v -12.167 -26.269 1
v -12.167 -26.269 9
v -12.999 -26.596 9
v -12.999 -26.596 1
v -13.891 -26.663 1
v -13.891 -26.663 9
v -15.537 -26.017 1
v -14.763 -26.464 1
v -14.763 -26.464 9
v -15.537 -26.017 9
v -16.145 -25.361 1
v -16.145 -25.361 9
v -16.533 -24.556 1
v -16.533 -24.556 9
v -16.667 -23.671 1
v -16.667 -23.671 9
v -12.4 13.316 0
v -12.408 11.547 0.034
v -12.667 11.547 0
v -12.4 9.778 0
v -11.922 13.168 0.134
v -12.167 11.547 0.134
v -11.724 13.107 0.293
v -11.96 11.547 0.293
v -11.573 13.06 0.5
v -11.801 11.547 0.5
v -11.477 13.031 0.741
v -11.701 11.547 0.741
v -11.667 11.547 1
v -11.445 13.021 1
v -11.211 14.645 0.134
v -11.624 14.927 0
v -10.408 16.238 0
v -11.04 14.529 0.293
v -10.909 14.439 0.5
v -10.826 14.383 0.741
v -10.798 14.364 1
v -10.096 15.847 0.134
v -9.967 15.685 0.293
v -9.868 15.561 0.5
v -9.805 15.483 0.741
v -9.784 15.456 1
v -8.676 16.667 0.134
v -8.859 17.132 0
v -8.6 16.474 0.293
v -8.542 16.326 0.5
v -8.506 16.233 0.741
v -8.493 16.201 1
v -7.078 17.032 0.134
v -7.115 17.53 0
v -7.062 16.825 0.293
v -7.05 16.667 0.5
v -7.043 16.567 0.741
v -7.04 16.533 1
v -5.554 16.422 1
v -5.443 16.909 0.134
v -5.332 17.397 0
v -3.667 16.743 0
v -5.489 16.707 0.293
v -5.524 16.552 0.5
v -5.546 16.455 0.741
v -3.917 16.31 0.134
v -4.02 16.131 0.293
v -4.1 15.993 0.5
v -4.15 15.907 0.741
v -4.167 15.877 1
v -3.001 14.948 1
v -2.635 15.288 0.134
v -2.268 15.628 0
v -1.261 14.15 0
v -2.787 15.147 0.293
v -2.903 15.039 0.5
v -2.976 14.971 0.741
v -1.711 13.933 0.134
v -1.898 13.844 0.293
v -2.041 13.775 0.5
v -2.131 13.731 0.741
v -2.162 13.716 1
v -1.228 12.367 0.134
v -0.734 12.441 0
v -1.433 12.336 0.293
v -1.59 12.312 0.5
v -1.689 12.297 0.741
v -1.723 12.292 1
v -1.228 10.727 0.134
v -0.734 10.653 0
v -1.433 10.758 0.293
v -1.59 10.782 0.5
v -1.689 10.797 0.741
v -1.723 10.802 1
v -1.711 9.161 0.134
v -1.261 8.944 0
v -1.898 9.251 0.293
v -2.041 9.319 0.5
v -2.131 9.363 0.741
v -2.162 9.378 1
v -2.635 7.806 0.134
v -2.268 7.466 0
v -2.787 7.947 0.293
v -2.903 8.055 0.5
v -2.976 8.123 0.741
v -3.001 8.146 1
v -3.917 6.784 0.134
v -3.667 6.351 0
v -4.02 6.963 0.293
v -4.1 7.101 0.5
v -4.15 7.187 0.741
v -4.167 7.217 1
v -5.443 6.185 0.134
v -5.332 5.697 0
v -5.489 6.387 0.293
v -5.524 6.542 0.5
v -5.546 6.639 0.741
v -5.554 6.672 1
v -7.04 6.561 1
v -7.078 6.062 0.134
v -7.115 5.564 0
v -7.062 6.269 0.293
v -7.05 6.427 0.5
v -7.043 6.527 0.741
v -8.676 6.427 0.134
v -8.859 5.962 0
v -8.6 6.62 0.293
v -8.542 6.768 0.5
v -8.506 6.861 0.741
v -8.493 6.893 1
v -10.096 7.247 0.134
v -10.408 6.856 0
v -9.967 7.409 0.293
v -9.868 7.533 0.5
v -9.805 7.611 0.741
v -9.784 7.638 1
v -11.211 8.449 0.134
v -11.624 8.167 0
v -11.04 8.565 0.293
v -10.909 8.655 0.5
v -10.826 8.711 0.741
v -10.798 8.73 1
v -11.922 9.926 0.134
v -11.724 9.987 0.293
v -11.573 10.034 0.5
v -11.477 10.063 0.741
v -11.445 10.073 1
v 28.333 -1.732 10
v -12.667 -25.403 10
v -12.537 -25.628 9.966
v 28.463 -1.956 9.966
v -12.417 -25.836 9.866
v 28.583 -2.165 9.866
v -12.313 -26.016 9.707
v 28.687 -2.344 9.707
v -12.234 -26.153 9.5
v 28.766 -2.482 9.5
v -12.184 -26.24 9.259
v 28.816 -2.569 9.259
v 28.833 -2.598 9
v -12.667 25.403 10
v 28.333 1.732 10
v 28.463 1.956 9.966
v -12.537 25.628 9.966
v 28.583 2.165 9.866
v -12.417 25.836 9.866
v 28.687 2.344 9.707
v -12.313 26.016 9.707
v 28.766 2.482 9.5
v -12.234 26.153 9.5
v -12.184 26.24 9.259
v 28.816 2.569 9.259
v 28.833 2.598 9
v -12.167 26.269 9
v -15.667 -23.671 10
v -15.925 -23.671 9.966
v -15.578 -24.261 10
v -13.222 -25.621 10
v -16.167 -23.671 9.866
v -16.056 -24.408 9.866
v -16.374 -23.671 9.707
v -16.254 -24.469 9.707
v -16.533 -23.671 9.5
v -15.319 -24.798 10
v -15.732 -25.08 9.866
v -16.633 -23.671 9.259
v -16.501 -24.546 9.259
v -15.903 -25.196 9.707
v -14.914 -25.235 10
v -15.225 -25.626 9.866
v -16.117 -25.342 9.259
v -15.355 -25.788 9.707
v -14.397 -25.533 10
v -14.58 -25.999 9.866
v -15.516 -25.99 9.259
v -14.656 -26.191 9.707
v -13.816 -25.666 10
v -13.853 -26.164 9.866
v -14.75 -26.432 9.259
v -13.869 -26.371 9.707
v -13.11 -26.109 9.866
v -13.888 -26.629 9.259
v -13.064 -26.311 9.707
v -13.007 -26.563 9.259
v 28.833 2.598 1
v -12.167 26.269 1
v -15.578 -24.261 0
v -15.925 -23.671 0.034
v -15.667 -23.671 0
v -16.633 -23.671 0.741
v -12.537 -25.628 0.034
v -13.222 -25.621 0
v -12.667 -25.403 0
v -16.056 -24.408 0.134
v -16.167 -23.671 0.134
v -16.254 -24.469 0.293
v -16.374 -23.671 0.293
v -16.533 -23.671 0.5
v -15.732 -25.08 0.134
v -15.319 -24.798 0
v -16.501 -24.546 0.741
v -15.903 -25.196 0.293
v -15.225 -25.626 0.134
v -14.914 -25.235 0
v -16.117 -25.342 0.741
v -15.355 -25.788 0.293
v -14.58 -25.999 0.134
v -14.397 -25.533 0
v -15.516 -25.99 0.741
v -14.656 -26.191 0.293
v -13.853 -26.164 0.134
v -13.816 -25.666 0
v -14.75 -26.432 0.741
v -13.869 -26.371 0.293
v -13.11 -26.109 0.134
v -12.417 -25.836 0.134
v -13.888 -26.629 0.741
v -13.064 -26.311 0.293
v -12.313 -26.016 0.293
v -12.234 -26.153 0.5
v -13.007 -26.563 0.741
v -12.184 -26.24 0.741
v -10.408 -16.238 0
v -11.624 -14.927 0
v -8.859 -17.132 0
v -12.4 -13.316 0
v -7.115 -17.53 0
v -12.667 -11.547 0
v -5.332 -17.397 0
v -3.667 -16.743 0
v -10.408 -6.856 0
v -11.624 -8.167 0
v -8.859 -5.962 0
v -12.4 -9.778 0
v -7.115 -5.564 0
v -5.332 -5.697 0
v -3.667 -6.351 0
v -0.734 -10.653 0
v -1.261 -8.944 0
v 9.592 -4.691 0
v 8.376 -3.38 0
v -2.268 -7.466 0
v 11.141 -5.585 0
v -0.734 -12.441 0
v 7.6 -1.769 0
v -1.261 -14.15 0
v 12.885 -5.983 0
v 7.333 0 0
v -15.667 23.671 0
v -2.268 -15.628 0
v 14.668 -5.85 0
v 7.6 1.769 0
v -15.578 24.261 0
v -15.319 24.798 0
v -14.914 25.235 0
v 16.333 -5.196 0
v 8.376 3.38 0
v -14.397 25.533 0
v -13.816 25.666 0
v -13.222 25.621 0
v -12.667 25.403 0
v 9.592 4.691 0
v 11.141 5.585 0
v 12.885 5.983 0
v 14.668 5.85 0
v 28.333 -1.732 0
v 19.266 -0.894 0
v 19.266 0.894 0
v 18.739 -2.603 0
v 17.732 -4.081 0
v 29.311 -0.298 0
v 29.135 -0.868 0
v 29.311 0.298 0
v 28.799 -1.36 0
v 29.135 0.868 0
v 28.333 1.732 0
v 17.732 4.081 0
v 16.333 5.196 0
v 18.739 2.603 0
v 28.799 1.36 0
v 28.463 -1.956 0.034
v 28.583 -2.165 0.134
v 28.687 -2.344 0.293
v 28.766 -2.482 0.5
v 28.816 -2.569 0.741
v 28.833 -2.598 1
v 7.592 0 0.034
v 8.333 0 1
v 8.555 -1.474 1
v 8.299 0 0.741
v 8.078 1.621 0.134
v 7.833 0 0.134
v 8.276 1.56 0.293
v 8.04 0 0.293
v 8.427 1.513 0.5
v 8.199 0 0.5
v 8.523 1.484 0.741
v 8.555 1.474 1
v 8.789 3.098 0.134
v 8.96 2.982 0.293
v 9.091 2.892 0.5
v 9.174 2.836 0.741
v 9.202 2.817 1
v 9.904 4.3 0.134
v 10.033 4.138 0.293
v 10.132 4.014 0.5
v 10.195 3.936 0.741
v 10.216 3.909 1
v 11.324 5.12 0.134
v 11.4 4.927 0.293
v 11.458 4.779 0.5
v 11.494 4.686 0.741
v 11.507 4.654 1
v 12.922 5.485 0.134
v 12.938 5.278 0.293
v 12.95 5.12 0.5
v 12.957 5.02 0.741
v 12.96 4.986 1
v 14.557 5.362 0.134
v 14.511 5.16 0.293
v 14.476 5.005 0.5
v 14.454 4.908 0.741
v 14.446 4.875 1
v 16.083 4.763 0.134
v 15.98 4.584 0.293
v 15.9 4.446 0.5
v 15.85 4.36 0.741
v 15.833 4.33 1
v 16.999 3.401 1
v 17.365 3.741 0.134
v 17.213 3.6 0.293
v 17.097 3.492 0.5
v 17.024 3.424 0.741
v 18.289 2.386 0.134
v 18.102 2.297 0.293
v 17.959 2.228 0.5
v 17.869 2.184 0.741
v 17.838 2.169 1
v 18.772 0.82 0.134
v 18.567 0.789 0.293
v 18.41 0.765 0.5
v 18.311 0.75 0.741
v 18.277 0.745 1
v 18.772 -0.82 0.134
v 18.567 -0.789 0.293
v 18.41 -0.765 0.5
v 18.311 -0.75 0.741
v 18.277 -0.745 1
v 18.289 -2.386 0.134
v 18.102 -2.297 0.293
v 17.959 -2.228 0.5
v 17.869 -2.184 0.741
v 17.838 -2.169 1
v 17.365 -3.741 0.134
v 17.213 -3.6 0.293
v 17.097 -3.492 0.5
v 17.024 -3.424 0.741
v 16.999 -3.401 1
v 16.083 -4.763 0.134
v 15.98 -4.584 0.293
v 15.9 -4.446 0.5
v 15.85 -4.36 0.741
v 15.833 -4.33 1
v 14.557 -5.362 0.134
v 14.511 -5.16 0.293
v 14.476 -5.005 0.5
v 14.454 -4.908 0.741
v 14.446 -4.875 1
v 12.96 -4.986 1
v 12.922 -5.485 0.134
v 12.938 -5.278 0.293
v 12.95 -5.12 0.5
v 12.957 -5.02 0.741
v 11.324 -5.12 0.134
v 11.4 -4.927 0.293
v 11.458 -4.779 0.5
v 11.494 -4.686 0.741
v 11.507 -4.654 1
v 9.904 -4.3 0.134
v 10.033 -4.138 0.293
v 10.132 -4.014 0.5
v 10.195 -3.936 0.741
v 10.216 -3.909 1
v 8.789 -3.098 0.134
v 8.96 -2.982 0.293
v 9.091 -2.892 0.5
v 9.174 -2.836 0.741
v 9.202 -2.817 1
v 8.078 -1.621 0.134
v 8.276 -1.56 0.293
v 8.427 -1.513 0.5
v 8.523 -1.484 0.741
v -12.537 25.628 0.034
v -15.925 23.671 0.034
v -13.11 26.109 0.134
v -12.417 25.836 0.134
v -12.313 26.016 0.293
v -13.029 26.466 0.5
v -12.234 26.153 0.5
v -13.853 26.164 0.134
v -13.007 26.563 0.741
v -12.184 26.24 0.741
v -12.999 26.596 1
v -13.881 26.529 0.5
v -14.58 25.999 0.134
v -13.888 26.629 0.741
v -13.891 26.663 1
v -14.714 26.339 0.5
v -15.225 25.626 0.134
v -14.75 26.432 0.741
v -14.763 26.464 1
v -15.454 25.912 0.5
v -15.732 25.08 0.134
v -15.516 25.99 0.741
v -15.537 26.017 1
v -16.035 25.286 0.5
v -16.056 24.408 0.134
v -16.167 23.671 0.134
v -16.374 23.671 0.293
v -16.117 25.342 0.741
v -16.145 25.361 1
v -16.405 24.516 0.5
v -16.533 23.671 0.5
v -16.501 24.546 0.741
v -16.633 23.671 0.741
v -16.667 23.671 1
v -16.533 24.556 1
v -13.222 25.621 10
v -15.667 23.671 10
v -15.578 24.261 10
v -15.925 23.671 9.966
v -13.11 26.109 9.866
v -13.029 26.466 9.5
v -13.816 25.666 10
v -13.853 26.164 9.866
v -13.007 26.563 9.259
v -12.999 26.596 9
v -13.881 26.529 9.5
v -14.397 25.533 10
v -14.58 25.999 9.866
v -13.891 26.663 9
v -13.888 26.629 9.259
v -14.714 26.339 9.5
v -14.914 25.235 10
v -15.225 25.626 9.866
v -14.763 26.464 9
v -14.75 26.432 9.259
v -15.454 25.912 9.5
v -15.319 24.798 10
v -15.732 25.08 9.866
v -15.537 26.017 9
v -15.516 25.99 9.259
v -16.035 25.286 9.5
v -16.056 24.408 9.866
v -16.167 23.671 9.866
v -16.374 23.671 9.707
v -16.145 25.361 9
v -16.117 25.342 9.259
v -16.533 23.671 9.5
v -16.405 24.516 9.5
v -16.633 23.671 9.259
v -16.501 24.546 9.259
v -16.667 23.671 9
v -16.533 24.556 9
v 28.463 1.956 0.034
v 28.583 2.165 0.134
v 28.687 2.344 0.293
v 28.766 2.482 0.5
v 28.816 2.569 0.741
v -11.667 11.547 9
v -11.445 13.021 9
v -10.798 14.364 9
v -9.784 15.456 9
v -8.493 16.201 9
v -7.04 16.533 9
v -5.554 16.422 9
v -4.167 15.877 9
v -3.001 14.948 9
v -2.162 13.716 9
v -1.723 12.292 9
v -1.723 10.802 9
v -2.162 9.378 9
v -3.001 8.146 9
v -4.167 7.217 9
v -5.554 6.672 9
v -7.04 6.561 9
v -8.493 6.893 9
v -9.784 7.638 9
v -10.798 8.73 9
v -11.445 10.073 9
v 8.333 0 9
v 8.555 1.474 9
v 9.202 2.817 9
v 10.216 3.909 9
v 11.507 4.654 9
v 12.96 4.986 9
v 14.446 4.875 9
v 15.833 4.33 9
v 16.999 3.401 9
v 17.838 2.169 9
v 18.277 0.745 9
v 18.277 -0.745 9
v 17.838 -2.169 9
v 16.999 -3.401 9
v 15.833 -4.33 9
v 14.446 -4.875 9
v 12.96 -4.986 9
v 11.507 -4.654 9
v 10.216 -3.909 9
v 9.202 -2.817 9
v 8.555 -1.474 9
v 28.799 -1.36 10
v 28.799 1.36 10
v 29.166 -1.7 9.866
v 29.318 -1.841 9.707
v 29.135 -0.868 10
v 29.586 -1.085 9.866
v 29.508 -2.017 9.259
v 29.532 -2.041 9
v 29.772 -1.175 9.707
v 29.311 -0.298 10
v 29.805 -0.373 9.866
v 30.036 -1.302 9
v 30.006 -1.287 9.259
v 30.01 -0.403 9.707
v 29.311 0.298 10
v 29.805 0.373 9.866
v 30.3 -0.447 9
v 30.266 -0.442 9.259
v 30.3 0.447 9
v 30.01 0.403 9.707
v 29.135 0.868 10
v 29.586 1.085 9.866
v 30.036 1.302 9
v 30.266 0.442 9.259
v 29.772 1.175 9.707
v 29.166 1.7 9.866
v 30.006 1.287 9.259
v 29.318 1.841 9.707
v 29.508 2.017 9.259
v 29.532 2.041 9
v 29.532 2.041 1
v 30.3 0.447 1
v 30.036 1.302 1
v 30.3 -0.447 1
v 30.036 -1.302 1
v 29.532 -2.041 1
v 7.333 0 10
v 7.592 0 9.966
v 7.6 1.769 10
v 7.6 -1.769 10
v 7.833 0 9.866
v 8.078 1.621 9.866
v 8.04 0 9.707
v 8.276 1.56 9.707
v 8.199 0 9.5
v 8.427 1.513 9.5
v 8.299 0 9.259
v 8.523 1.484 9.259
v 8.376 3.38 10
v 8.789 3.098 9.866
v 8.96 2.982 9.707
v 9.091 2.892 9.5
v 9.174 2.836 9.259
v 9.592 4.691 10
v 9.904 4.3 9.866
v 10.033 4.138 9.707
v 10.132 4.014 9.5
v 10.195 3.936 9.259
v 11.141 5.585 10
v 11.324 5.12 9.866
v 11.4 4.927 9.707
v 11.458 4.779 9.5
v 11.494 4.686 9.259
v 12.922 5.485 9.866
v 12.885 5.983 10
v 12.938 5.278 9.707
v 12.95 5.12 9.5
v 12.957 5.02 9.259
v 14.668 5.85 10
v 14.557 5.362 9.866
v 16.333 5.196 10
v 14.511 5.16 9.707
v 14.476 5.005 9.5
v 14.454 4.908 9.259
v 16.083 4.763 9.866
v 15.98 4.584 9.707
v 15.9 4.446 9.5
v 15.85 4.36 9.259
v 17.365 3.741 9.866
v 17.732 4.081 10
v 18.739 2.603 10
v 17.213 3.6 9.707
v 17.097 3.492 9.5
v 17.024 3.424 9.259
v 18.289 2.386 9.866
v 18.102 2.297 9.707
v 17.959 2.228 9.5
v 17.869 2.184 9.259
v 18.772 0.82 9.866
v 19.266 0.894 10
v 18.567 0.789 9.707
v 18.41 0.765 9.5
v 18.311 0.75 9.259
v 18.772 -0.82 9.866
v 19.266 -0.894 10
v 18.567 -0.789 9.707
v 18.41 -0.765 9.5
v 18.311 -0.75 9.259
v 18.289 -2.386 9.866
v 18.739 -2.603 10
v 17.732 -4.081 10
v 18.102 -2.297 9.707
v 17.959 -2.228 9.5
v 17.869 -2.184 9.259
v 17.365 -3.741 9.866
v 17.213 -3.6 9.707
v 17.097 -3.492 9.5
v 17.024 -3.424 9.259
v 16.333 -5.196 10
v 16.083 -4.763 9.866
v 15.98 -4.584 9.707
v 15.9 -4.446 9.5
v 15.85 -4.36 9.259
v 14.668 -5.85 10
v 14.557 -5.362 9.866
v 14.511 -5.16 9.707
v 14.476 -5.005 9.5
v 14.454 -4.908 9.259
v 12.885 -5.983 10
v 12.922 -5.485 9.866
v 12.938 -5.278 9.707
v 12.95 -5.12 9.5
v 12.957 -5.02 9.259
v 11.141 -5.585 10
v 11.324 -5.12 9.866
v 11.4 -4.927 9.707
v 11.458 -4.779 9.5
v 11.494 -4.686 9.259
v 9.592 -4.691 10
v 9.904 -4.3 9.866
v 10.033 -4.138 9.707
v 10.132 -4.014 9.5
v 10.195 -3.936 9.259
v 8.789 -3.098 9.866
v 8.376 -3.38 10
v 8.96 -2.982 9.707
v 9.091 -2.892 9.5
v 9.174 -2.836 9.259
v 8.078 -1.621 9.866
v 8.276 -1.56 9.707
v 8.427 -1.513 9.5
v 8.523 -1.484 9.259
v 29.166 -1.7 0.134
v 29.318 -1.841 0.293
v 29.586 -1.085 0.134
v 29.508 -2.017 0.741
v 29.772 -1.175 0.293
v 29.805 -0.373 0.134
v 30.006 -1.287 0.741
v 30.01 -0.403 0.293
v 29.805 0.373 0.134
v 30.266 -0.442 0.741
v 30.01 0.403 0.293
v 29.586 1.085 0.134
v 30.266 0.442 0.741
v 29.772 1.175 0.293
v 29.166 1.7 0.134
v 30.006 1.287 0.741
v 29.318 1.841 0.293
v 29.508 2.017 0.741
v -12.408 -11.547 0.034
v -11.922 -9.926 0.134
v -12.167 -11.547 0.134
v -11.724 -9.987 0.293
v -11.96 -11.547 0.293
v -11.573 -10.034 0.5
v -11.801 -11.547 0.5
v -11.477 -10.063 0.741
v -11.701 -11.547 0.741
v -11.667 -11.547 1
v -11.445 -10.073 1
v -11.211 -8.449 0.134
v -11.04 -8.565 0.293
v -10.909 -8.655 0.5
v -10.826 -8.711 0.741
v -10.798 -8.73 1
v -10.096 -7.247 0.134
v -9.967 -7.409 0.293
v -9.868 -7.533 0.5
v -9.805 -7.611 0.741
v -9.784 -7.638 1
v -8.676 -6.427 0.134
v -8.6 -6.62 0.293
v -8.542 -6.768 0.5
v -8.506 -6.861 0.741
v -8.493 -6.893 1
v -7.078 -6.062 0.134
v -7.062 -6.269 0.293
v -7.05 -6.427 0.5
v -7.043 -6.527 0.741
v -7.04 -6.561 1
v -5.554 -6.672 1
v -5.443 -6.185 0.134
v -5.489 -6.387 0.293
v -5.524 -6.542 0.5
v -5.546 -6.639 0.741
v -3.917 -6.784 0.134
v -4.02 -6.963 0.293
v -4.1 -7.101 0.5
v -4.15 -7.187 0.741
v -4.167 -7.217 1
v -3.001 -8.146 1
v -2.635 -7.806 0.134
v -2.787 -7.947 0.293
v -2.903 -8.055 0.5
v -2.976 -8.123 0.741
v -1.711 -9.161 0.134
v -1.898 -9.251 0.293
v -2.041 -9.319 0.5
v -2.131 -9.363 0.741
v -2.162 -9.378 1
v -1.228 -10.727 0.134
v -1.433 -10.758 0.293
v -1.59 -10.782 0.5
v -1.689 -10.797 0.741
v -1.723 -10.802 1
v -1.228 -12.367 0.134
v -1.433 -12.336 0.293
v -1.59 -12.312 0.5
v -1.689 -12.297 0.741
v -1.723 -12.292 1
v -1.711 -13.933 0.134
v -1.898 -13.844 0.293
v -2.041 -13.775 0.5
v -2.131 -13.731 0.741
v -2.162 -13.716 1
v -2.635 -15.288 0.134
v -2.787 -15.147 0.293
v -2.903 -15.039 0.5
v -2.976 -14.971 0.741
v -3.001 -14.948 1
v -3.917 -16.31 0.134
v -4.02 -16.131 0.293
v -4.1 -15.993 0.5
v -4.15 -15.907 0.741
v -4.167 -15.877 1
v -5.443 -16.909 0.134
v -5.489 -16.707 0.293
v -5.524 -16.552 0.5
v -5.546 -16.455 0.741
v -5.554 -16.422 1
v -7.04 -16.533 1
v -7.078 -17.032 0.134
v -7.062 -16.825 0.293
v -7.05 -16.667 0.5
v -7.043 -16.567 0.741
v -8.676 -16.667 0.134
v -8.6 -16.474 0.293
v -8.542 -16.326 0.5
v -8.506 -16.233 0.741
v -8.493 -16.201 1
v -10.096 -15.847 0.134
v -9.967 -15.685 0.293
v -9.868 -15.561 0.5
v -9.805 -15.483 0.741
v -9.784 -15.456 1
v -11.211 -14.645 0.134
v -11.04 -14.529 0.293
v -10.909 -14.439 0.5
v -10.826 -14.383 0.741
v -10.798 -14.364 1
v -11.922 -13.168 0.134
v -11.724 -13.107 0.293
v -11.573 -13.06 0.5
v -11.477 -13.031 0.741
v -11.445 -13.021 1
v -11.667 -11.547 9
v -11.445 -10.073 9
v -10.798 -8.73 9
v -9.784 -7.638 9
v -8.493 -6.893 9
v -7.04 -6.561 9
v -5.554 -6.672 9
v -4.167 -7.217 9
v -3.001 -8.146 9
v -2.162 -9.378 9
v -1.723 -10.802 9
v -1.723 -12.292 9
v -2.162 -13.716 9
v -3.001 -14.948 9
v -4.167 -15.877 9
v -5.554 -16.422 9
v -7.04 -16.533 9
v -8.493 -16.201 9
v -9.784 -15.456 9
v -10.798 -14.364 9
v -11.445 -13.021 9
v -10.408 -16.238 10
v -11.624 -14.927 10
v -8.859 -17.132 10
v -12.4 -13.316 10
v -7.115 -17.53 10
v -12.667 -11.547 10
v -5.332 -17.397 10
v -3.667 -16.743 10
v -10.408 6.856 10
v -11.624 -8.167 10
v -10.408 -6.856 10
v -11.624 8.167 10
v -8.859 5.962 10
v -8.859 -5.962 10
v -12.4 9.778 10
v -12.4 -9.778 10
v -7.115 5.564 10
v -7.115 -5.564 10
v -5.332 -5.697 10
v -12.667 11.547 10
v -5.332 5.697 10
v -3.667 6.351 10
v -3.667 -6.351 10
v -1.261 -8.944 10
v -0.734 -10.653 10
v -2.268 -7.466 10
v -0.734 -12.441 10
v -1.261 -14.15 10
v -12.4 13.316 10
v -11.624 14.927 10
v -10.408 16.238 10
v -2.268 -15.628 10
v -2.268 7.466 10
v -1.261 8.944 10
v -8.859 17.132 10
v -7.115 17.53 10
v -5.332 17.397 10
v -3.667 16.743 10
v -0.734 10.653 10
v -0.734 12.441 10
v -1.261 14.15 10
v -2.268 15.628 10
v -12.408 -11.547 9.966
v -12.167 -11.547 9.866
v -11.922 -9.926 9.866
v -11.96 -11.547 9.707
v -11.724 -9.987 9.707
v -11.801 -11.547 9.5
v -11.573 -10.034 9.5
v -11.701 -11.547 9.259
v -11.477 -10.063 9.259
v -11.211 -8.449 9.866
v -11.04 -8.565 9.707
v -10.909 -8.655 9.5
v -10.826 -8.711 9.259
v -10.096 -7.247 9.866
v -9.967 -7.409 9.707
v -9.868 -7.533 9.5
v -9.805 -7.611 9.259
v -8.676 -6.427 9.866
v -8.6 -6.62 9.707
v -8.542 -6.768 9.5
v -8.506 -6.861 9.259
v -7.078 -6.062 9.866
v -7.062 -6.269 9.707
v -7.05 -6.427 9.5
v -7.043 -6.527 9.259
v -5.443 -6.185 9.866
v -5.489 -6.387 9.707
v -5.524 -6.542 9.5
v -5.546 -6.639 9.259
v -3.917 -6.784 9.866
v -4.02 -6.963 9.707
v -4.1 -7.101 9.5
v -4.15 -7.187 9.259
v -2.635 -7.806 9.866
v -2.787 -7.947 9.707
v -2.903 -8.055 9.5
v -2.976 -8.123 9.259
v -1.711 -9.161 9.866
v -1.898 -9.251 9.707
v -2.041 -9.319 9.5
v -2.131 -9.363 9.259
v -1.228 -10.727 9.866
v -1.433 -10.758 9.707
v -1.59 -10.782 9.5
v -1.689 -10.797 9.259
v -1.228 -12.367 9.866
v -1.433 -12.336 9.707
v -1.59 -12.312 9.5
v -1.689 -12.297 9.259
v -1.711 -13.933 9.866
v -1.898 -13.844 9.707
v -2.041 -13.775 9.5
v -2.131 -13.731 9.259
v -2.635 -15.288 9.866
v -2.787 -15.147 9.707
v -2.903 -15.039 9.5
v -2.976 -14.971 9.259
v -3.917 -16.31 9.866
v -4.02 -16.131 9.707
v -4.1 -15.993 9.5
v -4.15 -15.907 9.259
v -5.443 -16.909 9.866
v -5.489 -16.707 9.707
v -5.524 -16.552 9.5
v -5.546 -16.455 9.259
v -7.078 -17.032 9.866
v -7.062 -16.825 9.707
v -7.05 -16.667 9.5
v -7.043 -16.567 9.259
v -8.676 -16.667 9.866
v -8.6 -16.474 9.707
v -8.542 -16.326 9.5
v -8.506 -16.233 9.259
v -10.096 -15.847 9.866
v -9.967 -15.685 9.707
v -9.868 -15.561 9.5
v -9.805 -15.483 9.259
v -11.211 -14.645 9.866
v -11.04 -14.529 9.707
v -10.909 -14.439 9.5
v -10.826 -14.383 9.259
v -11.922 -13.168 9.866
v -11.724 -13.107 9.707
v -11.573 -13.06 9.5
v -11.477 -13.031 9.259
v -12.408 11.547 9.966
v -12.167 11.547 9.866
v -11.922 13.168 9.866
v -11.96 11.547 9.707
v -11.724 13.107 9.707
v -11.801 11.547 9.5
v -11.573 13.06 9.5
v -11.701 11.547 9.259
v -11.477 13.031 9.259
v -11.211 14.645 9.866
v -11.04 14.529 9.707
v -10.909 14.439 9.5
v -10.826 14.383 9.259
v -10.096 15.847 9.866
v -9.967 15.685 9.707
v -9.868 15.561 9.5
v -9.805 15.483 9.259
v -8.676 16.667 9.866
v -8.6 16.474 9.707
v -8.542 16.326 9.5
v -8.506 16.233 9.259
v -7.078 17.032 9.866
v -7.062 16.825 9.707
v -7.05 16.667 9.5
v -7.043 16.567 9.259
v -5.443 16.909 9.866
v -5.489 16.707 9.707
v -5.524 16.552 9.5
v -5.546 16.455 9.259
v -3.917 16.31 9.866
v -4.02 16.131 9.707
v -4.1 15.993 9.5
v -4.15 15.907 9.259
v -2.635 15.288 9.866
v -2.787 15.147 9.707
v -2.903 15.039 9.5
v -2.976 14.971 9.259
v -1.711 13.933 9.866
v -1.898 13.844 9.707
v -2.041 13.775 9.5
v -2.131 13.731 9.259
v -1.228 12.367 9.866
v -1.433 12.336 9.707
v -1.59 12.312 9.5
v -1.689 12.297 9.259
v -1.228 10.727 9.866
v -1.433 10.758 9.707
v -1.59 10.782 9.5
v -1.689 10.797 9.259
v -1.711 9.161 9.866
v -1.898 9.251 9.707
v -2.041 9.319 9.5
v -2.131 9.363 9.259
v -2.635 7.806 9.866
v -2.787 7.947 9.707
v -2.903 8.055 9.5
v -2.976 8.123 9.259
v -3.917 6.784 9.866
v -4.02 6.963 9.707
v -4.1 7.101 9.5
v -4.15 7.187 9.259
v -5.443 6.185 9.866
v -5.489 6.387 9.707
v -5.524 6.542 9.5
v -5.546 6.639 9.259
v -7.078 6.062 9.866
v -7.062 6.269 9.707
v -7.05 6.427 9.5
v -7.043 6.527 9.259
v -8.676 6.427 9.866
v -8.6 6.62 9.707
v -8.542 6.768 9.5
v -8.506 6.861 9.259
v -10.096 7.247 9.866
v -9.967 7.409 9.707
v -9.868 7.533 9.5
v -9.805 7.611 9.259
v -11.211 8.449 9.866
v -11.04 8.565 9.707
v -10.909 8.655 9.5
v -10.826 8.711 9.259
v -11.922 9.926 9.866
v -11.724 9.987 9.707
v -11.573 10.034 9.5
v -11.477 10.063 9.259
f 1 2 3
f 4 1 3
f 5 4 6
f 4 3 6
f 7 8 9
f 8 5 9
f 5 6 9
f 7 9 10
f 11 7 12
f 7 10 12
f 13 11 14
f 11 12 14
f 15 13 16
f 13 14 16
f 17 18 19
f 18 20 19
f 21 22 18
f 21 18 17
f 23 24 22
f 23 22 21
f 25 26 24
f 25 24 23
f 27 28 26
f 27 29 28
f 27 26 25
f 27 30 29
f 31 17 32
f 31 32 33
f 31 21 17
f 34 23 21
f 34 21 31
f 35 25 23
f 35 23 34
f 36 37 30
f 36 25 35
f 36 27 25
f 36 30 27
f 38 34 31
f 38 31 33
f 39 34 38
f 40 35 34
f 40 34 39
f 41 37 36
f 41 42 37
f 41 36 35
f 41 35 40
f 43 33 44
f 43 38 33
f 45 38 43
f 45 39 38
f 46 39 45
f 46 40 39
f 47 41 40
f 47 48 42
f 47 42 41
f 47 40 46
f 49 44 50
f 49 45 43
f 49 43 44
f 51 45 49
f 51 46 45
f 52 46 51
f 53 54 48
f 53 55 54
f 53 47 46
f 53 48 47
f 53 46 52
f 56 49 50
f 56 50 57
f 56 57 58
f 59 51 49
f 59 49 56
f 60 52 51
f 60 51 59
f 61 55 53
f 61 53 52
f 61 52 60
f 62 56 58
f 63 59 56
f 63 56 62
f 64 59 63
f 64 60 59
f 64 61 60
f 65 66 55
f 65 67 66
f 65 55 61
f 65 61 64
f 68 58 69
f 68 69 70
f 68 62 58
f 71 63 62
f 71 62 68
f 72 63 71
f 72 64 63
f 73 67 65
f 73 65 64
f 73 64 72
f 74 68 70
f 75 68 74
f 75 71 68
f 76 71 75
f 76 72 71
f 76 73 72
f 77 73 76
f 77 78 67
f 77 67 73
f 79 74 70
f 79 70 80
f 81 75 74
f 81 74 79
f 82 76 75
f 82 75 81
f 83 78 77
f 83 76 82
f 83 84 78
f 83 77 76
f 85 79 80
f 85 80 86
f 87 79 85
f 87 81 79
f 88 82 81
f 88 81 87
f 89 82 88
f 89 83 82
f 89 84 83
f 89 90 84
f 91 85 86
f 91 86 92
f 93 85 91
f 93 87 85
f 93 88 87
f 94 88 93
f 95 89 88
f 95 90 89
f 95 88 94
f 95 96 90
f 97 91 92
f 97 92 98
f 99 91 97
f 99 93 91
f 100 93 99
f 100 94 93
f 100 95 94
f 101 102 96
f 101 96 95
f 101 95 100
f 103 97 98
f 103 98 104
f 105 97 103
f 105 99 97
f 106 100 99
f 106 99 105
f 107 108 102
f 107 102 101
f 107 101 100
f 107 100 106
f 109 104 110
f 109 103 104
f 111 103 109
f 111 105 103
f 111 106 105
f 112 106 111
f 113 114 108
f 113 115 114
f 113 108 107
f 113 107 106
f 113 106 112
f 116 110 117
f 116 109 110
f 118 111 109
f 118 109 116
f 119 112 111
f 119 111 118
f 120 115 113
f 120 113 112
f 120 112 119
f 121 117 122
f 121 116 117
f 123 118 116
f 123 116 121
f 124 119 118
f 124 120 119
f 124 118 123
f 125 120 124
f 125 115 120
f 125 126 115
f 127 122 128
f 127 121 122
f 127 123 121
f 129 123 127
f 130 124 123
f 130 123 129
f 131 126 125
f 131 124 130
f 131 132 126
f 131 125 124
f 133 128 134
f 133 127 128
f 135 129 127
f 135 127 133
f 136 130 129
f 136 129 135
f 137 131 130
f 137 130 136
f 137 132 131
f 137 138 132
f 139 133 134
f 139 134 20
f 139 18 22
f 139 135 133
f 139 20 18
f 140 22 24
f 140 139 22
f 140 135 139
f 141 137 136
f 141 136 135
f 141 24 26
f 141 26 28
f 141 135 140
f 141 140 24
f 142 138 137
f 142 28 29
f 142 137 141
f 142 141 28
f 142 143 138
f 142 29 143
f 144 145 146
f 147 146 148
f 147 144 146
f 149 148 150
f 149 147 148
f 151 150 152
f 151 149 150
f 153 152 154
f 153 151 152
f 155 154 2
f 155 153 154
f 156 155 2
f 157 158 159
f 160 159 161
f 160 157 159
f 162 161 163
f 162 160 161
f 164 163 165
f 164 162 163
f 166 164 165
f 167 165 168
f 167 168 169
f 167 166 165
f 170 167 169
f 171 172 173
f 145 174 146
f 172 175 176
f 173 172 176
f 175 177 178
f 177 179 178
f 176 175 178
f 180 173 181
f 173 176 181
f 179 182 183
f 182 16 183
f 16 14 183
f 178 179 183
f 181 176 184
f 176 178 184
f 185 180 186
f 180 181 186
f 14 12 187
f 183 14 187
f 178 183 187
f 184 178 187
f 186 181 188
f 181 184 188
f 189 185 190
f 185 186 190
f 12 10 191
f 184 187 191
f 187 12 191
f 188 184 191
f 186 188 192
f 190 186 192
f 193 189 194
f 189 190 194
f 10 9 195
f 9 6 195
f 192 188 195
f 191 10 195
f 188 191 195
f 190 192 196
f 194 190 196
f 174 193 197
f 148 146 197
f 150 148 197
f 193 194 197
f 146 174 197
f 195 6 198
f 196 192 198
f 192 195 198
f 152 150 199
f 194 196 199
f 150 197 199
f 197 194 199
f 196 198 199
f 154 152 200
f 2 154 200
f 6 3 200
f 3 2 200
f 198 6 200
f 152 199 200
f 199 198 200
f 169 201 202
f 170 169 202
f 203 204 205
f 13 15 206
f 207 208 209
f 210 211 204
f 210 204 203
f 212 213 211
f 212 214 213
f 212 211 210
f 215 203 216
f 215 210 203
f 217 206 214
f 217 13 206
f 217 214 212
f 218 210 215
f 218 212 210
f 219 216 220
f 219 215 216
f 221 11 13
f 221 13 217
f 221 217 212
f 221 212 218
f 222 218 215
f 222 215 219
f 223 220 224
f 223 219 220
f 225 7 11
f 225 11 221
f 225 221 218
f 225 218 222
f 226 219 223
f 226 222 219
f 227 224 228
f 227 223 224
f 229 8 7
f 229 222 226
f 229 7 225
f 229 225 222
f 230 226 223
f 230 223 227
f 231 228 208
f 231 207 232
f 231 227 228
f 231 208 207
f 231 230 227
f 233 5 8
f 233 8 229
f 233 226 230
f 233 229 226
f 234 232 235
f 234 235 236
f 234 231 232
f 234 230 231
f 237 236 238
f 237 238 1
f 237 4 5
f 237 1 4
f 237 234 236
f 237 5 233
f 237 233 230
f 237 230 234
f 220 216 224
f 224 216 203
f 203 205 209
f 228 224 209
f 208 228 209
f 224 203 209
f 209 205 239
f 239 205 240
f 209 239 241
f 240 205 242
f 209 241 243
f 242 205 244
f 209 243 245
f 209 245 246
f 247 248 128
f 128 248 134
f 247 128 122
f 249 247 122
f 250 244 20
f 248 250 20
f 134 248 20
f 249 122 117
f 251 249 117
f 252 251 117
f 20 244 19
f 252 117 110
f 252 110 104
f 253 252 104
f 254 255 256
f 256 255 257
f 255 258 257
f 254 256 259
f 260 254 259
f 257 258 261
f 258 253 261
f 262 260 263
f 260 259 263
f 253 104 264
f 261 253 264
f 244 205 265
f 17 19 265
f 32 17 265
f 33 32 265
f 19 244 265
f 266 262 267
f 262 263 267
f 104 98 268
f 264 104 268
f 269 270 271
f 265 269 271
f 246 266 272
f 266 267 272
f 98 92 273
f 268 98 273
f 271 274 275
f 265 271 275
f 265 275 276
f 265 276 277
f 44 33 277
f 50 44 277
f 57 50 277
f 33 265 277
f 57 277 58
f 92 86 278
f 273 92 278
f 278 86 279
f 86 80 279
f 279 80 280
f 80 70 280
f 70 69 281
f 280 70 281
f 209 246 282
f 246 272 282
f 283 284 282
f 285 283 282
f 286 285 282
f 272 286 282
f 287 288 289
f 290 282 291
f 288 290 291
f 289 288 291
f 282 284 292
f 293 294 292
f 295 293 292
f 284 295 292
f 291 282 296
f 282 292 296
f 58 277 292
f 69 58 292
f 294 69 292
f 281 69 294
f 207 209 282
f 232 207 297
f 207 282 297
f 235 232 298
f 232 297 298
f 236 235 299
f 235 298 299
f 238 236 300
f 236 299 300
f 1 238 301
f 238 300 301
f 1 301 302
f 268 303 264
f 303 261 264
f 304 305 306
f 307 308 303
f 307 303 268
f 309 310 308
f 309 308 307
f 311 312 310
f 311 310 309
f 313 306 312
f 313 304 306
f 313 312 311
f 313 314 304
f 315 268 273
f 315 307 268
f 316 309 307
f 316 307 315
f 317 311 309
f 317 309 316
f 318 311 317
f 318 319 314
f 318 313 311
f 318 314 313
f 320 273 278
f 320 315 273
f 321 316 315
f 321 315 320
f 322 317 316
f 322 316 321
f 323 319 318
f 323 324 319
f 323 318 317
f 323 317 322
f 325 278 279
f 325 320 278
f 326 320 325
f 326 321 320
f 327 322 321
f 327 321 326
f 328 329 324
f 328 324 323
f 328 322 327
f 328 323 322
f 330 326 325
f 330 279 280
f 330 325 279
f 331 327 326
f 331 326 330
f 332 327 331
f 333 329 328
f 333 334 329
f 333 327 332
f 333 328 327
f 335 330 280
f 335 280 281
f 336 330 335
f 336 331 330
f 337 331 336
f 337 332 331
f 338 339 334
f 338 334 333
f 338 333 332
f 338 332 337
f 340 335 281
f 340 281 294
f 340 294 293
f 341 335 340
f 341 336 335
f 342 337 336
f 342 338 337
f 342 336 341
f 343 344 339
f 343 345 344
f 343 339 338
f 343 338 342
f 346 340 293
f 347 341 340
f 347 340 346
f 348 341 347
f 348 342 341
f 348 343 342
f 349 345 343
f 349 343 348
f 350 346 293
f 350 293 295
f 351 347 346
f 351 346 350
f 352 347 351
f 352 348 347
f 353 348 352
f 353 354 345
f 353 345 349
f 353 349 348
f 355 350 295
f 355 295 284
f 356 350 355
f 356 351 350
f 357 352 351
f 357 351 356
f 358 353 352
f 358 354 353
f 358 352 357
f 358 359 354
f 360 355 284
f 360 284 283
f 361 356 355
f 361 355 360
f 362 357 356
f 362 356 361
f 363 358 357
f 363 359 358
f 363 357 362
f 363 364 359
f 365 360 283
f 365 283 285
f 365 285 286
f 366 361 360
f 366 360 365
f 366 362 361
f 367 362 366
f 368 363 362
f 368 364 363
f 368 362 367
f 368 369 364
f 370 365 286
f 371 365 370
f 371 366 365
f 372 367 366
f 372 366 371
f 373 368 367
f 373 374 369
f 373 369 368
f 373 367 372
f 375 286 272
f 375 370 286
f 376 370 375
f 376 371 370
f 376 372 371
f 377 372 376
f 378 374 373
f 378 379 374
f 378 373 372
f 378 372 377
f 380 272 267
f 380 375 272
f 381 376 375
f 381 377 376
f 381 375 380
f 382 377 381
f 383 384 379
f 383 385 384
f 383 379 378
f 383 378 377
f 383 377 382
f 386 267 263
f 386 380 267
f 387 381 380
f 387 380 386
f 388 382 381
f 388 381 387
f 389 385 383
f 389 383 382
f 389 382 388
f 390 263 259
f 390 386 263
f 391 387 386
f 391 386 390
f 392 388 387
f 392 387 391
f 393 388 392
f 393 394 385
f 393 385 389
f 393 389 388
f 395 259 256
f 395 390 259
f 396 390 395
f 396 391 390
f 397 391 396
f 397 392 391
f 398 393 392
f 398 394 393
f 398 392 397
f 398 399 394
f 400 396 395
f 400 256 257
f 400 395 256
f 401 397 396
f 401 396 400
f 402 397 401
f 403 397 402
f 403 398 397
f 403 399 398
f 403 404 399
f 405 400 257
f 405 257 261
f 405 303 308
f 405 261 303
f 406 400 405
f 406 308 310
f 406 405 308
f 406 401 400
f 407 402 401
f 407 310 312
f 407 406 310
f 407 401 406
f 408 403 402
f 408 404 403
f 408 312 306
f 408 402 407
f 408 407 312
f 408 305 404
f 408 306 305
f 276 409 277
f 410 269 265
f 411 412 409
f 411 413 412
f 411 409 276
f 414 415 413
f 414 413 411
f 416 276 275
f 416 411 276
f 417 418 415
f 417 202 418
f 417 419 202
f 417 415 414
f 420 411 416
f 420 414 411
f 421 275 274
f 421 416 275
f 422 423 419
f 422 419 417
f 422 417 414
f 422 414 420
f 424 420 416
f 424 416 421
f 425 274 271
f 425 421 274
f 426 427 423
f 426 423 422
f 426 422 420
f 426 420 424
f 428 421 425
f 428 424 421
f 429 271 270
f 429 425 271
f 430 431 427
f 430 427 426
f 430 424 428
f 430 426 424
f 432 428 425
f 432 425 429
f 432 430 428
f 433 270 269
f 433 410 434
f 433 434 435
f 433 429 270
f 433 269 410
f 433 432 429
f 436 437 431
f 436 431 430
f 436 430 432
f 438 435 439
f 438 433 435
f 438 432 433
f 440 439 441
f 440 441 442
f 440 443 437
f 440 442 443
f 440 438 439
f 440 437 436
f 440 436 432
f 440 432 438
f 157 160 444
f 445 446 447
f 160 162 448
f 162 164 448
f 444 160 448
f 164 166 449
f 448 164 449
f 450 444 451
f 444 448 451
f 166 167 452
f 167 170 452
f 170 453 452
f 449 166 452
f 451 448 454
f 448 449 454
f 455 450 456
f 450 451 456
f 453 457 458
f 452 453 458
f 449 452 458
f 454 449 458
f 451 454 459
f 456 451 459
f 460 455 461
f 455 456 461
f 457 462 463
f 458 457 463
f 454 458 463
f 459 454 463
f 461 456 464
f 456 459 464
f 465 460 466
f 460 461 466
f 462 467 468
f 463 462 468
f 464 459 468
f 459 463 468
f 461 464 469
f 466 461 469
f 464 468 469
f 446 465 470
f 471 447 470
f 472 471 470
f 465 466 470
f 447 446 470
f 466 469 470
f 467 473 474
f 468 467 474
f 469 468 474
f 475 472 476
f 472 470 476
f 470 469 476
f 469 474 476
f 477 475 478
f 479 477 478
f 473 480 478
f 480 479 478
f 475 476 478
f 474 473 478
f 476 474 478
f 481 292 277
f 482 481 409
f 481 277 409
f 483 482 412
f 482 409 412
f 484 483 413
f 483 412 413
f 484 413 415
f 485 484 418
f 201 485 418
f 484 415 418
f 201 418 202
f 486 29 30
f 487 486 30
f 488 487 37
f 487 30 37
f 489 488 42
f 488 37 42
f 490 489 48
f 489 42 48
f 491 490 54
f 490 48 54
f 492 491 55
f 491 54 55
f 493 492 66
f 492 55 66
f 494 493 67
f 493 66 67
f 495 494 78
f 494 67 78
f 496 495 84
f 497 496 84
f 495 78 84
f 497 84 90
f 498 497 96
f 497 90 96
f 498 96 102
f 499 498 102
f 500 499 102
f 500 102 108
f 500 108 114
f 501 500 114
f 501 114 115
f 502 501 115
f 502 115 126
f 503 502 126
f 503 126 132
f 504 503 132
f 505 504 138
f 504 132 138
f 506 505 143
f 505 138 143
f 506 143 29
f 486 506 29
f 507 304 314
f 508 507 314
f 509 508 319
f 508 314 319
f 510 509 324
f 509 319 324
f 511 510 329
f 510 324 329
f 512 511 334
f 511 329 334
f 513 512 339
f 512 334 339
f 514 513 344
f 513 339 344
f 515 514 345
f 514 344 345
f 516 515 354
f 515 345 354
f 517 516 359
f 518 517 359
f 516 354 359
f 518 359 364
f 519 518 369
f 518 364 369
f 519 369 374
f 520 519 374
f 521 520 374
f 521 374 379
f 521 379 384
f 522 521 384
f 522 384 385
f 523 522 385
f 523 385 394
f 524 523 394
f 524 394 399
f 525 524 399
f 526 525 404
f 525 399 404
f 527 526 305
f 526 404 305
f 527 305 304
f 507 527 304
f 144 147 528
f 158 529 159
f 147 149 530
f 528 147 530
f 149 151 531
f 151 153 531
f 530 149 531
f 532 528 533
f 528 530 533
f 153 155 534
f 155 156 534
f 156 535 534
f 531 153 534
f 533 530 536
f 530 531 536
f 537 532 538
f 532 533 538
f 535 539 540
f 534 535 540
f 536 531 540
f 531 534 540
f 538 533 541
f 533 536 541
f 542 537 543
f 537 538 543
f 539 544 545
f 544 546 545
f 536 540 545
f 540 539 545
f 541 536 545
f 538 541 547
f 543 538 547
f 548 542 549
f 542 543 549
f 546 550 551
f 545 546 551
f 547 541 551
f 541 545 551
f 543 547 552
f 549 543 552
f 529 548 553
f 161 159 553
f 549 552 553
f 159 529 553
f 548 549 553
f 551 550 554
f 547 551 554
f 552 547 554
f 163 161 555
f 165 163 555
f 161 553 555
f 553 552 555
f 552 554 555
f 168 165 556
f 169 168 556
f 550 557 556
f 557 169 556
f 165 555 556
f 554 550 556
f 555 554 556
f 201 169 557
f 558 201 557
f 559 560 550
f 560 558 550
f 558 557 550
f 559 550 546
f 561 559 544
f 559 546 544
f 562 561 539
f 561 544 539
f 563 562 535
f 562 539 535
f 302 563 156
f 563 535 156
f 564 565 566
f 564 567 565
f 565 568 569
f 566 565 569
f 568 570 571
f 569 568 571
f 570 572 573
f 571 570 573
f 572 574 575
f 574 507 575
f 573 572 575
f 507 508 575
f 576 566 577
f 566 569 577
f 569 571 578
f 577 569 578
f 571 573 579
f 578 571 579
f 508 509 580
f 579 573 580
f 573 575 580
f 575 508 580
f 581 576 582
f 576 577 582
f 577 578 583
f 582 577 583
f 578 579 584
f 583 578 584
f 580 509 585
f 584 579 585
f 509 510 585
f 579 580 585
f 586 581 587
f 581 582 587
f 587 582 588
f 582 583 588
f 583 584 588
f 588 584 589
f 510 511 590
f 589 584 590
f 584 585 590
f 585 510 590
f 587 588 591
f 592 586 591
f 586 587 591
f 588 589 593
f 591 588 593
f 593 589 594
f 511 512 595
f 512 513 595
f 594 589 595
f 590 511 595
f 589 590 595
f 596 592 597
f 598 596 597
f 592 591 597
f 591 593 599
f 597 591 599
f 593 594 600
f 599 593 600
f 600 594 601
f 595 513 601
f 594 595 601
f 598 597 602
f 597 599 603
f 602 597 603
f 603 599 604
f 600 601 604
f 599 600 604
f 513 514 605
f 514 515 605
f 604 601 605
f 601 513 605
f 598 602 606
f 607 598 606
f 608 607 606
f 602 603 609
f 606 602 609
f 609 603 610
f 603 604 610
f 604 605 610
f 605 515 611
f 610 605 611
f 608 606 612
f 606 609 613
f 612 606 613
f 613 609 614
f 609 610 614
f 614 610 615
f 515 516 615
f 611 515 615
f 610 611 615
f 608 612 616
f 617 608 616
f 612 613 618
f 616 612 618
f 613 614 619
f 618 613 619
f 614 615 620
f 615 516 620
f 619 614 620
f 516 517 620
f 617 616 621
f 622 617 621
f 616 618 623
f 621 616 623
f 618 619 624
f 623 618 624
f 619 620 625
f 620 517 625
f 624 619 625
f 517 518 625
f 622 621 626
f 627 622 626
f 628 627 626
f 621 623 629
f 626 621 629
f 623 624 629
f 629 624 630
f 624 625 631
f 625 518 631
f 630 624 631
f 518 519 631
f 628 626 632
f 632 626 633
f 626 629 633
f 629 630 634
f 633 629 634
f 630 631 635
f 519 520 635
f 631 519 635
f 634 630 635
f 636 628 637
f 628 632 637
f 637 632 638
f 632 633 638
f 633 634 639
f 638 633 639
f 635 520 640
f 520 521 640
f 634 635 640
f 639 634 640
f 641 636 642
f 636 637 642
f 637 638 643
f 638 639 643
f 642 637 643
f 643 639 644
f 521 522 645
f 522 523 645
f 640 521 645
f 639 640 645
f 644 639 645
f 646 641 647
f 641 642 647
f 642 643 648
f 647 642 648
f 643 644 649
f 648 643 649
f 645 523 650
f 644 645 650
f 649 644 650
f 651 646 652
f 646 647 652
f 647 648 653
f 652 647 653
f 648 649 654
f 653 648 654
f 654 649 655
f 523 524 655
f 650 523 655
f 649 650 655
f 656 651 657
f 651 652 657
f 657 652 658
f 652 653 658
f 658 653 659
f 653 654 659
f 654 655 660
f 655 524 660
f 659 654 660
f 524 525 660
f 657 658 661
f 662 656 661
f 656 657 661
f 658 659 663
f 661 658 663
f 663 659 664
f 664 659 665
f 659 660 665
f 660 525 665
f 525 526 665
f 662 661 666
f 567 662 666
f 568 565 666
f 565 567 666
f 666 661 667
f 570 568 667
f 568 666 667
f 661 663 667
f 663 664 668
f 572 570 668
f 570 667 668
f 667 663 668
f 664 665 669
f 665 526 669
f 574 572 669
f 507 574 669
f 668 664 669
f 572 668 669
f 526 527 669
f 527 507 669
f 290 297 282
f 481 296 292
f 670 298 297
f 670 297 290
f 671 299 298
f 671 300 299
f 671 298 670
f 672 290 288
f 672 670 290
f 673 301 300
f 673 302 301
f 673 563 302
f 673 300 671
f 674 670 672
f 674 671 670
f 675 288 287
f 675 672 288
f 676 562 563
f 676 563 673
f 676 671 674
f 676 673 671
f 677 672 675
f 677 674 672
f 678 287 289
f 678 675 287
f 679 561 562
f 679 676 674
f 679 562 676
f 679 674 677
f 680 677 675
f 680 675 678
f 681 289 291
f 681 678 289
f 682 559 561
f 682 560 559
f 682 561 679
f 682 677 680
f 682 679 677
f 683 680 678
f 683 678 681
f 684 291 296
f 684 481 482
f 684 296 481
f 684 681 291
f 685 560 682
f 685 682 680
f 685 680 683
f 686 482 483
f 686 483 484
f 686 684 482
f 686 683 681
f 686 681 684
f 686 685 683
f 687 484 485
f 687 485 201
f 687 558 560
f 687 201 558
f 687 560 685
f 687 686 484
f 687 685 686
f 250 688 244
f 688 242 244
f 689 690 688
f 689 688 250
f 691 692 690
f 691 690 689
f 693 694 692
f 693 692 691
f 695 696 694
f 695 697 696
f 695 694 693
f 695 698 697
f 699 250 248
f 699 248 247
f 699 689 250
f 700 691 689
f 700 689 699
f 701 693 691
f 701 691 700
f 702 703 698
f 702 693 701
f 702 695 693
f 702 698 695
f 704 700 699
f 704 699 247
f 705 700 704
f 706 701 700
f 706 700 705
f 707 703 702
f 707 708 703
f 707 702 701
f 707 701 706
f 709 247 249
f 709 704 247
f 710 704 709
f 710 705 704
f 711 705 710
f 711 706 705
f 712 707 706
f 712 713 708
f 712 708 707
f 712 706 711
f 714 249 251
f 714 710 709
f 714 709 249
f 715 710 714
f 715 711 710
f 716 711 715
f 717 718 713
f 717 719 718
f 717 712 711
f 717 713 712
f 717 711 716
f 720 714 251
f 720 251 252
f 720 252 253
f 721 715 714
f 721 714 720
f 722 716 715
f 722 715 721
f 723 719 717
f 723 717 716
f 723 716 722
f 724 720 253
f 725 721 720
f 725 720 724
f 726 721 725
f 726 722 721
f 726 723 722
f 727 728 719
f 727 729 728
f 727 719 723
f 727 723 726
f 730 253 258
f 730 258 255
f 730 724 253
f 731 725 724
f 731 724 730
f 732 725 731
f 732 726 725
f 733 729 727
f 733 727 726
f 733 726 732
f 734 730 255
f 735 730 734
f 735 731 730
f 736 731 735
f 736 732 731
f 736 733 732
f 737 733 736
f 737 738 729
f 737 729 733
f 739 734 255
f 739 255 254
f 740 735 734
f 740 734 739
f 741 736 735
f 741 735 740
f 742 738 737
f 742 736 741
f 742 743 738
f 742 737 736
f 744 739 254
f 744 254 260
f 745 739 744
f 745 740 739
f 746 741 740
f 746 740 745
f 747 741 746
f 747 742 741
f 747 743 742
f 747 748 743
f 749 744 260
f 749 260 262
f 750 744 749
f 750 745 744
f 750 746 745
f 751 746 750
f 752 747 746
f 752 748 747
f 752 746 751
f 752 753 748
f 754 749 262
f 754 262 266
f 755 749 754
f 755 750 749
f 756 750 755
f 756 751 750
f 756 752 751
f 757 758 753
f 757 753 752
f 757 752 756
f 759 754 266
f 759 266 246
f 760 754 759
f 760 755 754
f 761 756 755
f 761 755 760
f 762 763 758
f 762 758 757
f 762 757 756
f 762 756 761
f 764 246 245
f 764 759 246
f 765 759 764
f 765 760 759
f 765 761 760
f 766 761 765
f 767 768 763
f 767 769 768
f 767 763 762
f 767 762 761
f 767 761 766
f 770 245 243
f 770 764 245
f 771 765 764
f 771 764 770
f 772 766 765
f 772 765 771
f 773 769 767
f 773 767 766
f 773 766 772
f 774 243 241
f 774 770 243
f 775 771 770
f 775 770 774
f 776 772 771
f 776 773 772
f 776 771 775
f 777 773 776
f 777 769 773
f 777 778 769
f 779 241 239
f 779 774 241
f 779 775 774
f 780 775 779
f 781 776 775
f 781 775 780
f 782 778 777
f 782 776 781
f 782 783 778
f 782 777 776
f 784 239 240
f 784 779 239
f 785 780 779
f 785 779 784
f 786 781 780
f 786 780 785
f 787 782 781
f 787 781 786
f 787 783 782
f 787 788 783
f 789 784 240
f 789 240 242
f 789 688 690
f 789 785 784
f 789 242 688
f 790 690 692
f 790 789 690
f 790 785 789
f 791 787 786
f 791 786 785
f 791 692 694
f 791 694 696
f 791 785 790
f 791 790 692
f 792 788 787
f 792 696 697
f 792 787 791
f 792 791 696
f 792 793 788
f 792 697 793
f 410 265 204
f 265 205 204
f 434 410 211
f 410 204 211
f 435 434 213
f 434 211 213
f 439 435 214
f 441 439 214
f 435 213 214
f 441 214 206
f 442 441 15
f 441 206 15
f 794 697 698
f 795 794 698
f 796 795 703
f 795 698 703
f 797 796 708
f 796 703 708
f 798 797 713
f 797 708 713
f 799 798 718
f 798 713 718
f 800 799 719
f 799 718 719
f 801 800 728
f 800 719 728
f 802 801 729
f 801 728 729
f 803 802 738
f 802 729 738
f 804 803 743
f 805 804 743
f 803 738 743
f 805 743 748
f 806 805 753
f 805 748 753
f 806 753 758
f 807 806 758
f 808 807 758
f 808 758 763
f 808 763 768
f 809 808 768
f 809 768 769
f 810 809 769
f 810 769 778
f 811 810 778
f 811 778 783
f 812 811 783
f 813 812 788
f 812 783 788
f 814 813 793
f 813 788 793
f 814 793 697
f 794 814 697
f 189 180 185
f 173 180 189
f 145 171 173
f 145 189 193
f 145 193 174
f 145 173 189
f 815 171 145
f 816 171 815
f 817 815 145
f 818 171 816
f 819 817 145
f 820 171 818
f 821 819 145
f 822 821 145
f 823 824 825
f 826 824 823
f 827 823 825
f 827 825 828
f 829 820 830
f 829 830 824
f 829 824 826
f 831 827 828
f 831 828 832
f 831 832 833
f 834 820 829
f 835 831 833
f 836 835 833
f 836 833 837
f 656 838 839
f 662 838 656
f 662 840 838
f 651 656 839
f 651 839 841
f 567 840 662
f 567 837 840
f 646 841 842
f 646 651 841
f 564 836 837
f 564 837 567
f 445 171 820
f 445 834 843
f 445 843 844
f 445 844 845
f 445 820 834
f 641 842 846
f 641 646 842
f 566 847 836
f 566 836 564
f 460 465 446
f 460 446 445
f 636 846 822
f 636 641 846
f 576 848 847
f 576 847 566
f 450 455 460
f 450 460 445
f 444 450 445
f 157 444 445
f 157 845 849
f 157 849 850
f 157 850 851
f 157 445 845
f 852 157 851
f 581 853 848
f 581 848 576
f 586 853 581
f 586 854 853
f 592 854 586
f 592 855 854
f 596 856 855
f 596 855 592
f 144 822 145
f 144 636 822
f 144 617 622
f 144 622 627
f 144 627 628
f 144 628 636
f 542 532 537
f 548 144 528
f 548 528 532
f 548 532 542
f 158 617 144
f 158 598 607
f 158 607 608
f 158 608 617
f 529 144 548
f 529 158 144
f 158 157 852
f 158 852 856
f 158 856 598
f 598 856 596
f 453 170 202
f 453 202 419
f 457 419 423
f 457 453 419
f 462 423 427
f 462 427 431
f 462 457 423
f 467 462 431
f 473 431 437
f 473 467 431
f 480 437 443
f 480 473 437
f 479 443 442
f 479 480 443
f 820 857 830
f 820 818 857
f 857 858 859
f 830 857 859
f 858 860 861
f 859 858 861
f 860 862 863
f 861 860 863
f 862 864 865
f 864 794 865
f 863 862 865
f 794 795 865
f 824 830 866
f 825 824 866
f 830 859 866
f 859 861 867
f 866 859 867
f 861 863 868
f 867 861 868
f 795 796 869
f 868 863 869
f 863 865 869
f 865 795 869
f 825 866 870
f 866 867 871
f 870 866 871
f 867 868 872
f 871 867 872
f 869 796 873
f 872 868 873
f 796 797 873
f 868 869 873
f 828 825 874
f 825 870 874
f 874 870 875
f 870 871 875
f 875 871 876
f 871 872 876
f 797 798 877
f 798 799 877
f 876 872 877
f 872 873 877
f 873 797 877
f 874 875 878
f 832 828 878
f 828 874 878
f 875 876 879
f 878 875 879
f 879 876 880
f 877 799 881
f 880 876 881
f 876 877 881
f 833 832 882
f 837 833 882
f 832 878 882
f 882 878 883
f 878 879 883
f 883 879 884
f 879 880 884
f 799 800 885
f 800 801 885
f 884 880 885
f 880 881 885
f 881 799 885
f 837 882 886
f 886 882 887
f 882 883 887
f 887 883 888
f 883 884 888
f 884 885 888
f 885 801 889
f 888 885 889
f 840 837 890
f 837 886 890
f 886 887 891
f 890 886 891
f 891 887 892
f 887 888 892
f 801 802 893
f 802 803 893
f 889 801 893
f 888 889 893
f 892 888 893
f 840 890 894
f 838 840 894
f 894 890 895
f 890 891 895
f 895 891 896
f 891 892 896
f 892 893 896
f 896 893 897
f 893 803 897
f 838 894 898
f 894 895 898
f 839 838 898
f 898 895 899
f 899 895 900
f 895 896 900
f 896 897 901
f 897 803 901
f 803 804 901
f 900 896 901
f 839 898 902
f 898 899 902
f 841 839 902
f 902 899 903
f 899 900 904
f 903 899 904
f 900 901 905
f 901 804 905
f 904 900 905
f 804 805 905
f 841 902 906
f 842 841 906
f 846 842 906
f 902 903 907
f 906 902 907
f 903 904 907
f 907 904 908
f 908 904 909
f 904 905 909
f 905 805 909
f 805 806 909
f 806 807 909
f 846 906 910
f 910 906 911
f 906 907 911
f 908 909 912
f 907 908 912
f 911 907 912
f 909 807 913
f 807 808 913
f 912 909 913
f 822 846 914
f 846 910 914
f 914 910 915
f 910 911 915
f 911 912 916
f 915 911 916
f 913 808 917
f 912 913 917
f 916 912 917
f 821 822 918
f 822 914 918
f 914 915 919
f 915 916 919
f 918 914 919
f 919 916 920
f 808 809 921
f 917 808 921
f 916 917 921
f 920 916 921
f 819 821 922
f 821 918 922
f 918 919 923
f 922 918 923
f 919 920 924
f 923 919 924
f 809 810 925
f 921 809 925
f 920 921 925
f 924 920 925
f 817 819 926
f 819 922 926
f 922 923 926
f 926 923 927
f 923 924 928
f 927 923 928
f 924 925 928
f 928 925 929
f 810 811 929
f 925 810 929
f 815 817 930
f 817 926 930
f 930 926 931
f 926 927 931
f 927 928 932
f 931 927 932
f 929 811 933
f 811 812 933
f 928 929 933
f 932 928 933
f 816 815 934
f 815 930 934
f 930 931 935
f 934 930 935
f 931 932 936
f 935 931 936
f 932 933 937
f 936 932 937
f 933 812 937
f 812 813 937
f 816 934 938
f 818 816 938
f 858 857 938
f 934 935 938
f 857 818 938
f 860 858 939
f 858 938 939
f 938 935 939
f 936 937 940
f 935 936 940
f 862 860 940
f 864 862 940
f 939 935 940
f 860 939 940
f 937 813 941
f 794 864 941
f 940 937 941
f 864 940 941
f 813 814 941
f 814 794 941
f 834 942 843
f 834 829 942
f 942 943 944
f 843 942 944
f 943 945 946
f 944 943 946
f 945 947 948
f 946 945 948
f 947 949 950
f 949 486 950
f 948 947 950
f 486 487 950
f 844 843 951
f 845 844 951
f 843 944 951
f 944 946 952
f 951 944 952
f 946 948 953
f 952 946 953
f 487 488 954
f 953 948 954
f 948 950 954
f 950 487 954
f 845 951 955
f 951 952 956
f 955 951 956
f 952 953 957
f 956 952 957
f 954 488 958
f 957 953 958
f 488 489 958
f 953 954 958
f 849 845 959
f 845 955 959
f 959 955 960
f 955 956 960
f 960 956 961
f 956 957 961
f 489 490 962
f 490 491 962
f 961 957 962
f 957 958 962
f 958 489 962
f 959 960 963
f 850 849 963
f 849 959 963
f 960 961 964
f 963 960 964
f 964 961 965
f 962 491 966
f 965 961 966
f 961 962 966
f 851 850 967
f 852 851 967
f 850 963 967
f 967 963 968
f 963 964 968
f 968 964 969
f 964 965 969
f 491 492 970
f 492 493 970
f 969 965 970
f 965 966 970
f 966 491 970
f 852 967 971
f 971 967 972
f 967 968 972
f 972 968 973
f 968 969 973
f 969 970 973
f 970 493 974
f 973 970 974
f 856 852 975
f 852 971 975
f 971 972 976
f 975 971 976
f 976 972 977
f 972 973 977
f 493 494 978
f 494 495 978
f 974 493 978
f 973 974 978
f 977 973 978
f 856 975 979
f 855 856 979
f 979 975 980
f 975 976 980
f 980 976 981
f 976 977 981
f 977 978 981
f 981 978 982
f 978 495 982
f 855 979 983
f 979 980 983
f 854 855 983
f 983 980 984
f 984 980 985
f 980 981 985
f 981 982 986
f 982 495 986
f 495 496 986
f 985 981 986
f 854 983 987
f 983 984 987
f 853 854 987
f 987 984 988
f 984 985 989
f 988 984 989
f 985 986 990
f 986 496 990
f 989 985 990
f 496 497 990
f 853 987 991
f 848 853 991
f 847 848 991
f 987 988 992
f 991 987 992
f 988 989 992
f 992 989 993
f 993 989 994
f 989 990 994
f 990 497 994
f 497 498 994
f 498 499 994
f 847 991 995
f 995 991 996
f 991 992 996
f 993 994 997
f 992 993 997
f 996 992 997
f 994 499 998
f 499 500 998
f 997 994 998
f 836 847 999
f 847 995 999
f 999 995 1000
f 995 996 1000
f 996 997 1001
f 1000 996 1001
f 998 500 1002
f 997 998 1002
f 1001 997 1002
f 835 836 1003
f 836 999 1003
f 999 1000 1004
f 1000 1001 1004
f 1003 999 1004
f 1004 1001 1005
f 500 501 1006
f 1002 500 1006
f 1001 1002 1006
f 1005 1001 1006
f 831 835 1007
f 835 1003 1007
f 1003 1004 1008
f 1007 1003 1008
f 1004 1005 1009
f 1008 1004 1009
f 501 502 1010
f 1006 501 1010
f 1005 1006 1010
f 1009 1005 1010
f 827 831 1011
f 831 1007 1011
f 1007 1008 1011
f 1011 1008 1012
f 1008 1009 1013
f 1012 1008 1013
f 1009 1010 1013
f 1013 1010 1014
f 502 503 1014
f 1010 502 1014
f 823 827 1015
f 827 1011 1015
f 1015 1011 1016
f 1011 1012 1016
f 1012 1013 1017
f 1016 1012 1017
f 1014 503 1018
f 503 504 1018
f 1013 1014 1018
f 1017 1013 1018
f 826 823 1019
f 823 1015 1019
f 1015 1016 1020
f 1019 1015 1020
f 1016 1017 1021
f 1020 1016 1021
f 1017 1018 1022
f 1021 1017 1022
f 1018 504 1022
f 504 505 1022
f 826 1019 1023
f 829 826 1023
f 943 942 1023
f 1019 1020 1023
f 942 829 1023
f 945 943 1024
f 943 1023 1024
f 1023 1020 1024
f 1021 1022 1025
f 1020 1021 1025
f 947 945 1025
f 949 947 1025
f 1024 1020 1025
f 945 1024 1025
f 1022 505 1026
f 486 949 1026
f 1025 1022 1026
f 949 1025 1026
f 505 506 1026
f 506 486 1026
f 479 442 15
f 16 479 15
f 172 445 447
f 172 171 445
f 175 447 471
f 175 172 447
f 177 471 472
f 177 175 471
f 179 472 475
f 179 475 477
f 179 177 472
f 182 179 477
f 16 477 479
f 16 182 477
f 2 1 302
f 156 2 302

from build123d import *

# Parameters (mm, degrees)
BOSS_EXTRUDE1_DEPTH = 10
SKETCH2_R           = 5
CUT_EXTRUDE1_DEPTH  = 10
FILLET1_R           = 3
FILLET2_R           = 1


with BuildPart() as part:
    # Sketch1 → Boss-Extrude1 (new body)
    with BuildSketch(Plane.XY):
        Polygon((33.333333333, 0), (-16.666666667, 28.867513459), (-16.666666667, -28.867513459), align=None)
    extrude(amount=BOSS_EXTRUDE1_DEPTH)

    # Sketch2 → Cut-Extrude1 (cut)
    with BuildSketch(Plane(origin=(0, 0, 0), x_dir=(-1, 0, 0), z_dir=(0, 0, -1))):
        with Locations((6.666666667, 11.547005384)):
            Circle(SKETCH2_R)
        with Locations((6.666666667, -11.547005384)):
            Circle(SKETCH2_R)
        with Locations((-13.333333333, 0)):
            Circle(SKETCH2_R)
    extrude(amount=-CUT_EXTRUDE1_DEPTH, mode=Mode.SUBTRACT)

    # Fillet1
    fillet1_edges = [part.edges().sort_by_distance(p)[0] for p in [
        (-16.666666667, -28.867513459, 5),
        (-16.666666667, 28.867513459, 5),
        (33.333333333, 0, 5),
    ]]
    fillet(fillet1_edges, radius=FILLET1_R)

    # Fillet2
    fillet2_edges = [part.edges().sort_by_distance(p)[0] for p in [
        (-1.666666667, 11.547005384, 10),
        (-1.666666667, 11.547005384, 0),
        (-1.666666667, -11.547005384, 10),
        (-1.666666667, -11.547005384, 0),
        (18.333333333, 0, 10),
        (18.333333333, 0, 0),
        (-16.666666667, 0, 0),
        (-16.666666667, 0, 10),
        (8.333333333, -14.43375673, 0),
        (8.333333333, 14.43375673, 0),
        (-15.166666667, -26.269437248, 0),
        (30.333333333, 0, 0),
        (-15.166666667, 26.269437248, 0),
        (8.333333333, 14.43375673, 10),
        (8.333333333, -14.43375673, 10),
        (-15.166666667, -26.269437248, 10),
        (30.333333333, 0, 10),
        (-15.166666667, 26.269437248, 10),
    ]]
    fillet(fillet2_edges, radius=FILLET2_R)


solid = part.part
